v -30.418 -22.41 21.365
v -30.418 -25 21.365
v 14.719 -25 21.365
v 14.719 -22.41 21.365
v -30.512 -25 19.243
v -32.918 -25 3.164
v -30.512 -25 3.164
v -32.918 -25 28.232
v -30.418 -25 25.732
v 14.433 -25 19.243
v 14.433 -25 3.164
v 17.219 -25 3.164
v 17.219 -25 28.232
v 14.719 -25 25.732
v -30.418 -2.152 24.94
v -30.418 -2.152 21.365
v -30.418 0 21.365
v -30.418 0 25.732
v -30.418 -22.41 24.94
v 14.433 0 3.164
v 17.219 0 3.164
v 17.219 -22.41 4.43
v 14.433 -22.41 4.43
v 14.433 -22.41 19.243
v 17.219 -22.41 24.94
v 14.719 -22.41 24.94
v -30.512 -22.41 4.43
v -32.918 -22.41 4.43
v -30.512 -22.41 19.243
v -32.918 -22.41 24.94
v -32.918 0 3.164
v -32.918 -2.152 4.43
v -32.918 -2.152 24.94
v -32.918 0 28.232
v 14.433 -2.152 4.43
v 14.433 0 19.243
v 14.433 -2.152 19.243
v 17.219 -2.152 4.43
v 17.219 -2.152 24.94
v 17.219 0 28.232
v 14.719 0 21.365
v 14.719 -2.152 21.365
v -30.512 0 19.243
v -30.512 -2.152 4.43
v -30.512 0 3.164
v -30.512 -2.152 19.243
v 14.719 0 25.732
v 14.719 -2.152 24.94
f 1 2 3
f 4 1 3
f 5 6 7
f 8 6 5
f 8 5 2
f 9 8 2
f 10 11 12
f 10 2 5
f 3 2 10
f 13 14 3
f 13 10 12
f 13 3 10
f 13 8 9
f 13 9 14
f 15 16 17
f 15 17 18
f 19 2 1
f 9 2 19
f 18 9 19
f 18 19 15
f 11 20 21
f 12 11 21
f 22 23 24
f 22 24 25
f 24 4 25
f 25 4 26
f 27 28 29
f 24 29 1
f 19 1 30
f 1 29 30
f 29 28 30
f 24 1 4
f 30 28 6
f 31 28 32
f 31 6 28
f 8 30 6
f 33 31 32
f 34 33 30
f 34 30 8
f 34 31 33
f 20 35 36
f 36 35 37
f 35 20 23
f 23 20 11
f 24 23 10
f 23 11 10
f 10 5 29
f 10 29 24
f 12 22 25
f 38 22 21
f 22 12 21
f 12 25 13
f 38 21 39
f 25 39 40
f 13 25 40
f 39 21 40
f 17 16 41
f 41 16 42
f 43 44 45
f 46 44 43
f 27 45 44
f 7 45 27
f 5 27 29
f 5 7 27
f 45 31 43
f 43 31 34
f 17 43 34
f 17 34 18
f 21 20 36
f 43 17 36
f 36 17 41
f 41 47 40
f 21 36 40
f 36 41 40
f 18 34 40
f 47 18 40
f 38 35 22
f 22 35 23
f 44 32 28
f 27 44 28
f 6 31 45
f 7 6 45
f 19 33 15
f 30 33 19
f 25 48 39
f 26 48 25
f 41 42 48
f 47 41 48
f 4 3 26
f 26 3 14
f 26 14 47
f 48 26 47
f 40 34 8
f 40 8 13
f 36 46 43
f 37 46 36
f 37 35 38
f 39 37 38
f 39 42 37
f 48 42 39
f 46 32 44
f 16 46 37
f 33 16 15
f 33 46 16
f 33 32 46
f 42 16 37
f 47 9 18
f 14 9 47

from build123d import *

# Parameters (mm, degrees)
F0_W     = 100.2733111382
F0_H     = 50.1366546378
F1_DEPTH = 50
F2_W     = 90.2733111382
F2_H     = 8.7347067715
F3_DEPTH = 50.001
F5_W     = 40.5144635588
F5_H     = 41.020902805
F6_DEPTH = 100.2743111382
F7_W     = 89.8914821446
F7_H     = 32.1583626792
F8_DEPTH = 50.001
F9_SCALE = 0.5


with BuildPart() as f1:
    # F0 (on Front) → F1 (new body)
    with BuildSketch(Plane.XZ):
        with Locations((-15.6993567944, 31.3960765488)):
            Rectangle(F0_W, F0_H)
    extrude(amount=F1_DEPTH)

    # F2 (on face) → F3 (cut, through all)
    with BuildSketch(Plane.XZ.offset(50)):
        with Locations((-15.6993567944, 47.097050482)):
            Rectangle(F2_W, F2_H)
    extrude(amount=-F3_DEPTH, mode=Mode.SUBTRACT)

    # F5 (on face) → F6 (cut, through all)
    with BuildSketch(Plane(origin=(-65.8360123634, 0, 0), x_dir=(0, -1, 0), z_dir=(-1, 0, 0))):
        with Locations((24.5618959889, 29.3703549542)):
            Rectangle(F5_W, F5_H)
    extrude(amount=-F6_DEPTH, mode=Mode.SUBTRACT)

    # F7 (on face) → F8 (cut, through all)
    with BuildSketch(Plane.XZ.offset(50)):
        with Locations((-16.0791818053, 22.4069305696)):
            Rectangle(F7_W, F7_H)
    extrude(amount=-F8_DEPTH, mode=Mode.SUBTRACT)


with BuildPart() as f1_1:
    # F9: moved
    add(f1.part.scale(F9_SCALE))


solid = f1_1.part
